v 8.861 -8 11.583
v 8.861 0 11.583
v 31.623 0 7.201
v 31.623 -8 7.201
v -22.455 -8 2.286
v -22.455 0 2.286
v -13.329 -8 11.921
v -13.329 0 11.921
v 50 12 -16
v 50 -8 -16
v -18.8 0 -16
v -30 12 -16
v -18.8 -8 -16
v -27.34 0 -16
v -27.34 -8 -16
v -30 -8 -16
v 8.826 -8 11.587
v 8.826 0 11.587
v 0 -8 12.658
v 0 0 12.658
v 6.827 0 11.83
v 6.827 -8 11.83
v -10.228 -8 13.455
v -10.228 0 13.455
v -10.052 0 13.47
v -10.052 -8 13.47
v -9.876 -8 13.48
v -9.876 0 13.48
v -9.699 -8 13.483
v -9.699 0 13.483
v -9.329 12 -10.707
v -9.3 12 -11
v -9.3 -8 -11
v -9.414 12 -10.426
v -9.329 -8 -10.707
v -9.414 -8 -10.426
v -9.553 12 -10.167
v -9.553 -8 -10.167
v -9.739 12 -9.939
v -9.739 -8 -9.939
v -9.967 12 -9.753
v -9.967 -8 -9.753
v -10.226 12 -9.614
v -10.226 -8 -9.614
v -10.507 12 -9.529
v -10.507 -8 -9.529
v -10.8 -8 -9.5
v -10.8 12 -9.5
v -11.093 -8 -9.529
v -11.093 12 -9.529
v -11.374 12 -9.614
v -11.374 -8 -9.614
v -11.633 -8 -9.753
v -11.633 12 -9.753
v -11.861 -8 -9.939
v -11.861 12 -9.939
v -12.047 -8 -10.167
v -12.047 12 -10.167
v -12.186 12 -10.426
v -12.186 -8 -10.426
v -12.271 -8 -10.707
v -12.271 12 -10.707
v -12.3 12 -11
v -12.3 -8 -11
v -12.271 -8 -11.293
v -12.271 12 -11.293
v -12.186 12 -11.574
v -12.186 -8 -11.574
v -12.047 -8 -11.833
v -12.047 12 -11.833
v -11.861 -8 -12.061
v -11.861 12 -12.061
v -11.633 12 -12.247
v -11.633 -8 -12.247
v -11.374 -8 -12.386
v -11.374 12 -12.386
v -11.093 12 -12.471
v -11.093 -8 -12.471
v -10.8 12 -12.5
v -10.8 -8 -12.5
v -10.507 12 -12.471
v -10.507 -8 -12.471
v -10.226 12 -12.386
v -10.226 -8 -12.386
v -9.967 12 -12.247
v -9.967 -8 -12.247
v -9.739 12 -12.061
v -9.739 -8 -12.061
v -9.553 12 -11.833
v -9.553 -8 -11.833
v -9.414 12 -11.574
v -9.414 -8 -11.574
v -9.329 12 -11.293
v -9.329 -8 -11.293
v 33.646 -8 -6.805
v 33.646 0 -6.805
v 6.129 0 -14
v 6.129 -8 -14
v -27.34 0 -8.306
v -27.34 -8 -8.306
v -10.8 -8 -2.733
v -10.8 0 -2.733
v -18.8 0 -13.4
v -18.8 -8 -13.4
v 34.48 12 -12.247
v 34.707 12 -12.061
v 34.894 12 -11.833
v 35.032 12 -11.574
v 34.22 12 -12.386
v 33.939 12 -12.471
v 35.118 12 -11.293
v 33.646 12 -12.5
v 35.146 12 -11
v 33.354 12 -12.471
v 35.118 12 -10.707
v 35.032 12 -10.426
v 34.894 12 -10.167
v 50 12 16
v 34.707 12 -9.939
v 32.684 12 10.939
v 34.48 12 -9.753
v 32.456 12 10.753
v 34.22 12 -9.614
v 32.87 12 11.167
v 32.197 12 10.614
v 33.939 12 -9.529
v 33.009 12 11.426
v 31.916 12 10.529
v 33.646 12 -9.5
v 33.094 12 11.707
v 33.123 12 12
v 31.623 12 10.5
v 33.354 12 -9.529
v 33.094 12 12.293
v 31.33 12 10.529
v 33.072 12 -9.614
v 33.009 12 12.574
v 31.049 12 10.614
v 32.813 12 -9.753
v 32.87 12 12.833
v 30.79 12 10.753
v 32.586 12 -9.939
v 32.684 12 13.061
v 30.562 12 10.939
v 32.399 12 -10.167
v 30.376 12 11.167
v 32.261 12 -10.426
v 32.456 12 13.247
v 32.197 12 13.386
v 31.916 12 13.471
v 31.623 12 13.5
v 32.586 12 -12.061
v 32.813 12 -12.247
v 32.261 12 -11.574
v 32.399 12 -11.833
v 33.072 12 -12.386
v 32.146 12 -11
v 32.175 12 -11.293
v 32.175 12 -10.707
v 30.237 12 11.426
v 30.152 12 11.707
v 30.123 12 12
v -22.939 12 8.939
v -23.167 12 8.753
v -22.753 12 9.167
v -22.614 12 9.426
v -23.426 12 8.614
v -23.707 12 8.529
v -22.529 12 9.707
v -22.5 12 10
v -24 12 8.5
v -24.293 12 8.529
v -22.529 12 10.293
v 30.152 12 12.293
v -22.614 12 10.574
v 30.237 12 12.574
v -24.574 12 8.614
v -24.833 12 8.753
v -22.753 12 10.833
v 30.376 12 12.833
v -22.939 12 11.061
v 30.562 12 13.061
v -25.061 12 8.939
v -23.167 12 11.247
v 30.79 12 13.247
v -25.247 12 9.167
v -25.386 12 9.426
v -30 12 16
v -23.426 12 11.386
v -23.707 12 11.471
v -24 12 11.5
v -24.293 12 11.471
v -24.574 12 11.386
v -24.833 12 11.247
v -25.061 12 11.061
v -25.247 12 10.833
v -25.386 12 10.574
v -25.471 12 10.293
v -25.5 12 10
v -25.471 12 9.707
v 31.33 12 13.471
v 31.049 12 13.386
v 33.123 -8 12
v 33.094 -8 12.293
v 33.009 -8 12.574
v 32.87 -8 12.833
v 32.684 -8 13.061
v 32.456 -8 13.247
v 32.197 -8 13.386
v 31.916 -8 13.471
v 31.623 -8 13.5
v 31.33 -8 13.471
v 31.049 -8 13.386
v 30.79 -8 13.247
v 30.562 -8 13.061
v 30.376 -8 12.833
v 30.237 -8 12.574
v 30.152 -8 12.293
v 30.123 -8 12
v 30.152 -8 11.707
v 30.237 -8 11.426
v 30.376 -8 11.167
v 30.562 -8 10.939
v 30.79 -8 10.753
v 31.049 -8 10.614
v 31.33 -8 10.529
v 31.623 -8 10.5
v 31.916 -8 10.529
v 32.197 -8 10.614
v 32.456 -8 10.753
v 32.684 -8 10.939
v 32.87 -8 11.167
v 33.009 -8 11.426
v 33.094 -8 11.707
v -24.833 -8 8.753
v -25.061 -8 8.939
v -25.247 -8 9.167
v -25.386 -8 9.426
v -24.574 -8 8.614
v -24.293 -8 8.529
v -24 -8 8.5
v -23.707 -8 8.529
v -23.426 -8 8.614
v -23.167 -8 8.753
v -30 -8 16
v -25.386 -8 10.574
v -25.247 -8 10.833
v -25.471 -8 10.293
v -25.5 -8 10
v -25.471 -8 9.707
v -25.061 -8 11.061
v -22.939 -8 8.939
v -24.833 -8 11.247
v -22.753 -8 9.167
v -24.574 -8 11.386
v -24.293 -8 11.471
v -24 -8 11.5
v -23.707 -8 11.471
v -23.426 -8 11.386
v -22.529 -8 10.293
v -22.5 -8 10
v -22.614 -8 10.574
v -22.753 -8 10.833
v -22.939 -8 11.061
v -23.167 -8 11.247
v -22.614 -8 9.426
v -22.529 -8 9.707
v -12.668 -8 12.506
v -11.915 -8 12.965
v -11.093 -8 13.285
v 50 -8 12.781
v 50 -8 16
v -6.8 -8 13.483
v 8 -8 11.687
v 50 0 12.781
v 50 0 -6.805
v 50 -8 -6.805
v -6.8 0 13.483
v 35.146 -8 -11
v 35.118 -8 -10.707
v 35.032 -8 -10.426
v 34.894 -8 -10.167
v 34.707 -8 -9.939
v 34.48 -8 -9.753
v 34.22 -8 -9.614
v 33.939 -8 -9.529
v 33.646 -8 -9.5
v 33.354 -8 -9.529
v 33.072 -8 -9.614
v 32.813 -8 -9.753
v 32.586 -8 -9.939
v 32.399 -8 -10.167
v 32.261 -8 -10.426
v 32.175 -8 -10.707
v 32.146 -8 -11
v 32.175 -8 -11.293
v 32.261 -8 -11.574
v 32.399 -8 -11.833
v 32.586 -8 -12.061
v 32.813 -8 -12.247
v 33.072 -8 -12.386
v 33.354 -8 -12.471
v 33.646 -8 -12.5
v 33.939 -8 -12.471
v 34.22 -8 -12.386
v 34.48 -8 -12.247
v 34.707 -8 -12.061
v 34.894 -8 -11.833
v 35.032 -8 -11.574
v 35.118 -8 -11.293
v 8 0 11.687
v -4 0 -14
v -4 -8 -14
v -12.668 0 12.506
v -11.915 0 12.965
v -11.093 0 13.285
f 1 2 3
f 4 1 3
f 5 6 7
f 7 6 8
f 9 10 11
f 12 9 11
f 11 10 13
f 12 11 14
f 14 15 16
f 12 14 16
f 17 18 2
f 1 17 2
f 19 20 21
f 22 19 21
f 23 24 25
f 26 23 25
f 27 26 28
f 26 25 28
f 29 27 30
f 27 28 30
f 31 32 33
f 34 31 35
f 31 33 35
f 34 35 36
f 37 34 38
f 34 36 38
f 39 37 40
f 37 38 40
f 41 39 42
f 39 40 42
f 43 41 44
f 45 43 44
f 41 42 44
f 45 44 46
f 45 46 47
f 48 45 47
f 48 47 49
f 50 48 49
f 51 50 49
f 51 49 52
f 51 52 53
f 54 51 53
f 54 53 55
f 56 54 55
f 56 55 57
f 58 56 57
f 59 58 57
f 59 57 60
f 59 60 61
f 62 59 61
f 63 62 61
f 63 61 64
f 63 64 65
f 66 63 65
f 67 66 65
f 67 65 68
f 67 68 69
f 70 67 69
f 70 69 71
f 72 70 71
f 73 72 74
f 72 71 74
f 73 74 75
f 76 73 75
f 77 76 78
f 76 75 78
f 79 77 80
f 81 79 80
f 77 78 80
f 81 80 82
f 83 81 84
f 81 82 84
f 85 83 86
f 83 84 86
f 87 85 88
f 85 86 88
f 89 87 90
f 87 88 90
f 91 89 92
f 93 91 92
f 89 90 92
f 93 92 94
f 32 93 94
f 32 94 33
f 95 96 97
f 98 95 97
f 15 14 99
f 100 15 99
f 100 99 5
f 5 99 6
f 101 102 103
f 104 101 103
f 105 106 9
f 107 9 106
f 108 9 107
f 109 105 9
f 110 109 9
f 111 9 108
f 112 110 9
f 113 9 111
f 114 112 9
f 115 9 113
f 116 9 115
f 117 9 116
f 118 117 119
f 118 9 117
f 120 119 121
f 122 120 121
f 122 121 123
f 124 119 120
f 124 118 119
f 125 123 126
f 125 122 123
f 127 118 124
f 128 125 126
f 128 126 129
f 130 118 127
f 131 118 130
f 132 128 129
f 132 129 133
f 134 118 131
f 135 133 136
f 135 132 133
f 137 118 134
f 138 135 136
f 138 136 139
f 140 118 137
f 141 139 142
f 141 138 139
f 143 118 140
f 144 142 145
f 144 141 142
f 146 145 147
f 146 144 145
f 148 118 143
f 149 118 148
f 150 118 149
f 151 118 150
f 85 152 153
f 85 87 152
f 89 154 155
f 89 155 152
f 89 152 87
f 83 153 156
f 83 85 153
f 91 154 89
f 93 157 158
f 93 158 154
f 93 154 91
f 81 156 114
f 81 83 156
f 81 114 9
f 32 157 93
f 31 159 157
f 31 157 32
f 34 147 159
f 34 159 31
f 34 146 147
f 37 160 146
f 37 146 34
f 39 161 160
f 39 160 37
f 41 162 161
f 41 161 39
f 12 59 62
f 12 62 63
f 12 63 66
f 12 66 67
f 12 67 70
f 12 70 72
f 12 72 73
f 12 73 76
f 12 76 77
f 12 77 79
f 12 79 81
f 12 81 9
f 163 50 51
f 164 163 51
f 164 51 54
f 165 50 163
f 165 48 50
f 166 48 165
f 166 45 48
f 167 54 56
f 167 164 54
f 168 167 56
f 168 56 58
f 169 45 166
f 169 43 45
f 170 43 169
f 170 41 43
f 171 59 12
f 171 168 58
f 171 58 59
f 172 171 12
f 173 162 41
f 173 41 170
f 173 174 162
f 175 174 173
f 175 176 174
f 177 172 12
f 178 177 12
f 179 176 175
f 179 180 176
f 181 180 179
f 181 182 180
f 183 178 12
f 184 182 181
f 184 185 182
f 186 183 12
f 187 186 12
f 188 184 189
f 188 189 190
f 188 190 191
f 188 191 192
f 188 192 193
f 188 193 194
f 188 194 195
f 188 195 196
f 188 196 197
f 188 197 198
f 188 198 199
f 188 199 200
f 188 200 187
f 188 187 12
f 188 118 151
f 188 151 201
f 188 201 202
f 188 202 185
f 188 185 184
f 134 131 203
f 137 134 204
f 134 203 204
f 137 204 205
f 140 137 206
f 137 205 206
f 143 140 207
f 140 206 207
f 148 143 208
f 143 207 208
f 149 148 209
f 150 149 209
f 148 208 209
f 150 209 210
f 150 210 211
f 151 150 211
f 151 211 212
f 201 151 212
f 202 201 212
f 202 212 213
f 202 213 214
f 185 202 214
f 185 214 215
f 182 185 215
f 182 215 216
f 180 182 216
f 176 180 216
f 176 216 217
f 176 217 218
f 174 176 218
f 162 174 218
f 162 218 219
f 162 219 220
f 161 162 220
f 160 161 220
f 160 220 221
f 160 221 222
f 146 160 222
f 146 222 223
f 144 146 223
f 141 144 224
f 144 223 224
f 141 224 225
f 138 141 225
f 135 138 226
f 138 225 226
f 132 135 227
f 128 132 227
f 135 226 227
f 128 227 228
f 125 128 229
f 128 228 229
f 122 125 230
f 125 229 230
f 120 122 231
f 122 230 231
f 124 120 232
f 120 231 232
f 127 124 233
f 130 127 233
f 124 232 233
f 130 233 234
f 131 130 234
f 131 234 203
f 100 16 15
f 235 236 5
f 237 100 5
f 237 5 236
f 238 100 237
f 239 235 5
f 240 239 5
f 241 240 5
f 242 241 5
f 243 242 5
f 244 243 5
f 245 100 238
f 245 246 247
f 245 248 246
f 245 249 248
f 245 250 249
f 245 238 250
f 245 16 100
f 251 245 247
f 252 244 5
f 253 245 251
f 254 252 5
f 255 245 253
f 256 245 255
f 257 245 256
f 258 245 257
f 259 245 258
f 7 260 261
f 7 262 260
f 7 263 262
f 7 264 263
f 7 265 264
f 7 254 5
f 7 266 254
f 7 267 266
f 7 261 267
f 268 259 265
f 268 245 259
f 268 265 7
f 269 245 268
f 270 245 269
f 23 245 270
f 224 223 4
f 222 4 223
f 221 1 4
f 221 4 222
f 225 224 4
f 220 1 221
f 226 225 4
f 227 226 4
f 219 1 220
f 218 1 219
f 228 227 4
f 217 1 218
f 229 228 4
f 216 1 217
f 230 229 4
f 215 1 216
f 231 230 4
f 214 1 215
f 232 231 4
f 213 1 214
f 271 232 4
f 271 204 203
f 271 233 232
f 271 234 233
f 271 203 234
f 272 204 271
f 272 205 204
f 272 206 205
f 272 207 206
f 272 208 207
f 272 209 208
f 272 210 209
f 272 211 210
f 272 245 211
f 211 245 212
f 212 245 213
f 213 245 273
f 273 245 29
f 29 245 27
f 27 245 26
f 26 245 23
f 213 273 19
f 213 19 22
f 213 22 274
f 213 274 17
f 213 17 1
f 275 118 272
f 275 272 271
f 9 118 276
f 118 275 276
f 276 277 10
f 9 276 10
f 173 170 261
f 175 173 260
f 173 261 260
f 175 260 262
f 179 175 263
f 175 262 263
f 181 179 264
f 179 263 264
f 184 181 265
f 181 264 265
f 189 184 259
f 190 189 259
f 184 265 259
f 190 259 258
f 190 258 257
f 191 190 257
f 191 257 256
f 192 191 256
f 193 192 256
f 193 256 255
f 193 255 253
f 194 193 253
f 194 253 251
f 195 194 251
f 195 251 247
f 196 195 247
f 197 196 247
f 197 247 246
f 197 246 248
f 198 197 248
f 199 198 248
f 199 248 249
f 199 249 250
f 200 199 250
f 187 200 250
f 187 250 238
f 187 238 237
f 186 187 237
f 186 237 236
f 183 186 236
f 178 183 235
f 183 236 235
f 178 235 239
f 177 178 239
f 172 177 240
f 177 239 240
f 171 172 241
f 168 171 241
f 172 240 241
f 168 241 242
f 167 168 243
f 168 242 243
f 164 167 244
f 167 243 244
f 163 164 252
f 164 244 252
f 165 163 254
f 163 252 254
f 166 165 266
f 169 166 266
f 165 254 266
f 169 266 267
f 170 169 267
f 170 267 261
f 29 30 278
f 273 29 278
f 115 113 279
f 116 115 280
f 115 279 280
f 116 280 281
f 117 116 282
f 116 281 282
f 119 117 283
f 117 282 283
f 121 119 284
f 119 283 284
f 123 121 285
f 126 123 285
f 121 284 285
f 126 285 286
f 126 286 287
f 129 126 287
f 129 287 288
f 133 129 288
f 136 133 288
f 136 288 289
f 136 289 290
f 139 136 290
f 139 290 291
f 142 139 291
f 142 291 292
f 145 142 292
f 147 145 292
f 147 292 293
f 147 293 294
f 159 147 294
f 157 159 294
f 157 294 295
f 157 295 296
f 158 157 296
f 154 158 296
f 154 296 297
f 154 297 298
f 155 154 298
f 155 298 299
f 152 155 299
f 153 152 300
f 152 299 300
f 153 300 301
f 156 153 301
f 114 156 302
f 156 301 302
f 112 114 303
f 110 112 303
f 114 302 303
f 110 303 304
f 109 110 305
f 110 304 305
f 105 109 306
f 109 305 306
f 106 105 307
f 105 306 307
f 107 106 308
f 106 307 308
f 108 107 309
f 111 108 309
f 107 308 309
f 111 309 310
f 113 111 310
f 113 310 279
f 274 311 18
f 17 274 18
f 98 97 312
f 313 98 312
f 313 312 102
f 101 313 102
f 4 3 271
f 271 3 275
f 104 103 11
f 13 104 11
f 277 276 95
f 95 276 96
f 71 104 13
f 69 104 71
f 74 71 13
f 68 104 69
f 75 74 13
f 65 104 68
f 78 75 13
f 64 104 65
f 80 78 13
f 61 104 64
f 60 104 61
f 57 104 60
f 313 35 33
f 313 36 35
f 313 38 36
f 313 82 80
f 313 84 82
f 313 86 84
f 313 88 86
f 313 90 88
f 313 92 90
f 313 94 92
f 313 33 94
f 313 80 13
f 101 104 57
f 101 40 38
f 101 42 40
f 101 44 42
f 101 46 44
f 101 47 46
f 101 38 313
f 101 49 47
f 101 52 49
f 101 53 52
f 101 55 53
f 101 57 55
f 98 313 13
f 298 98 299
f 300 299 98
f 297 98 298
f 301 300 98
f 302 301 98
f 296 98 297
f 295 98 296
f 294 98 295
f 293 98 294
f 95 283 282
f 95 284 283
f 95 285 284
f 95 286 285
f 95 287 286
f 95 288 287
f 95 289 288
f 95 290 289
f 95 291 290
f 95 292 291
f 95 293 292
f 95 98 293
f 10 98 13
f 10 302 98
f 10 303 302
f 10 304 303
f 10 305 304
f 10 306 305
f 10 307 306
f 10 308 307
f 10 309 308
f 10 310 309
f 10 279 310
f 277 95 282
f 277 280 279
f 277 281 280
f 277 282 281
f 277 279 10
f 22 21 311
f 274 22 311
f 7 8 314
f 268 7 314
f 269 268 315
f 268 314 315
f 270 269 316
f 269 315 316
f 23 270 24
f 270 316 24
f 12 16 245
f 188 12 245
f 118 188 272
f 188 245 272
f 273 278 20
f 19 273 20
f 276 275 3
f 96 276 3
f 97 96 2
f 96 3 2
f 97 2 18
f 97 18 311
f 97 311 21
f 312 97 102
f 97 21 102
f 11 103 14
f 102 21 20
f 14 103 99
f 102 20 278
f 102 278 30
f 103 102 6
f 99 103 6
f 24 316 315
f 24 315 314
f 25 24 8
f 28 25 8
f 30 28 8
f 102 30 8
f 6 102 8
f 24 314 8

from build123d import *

# Parameters (mm, degrees)
F1_DEPTH = 8
F3_DEPTH = 12
F4_R     = 1.5
F5_DEPTH = 20.001


with BuildPart() as f1:
    # F0 (on Front) → F1 (new body)
    with BuildSketch(Plane.XZ):
        with BuildLine():
            Line((6.826992, 11.829606), (8, 11.68729))
            Line((8, 11.68729), (8.825802, 11.587099))
            Line((8.825802, 11.587099), (8.860913, 11.582839))
            Line((8.860913, 11.582839), (31.622957, 7.201101))
            Line((31.622957, 7.201101), (50, 12.781211))
            Line((50, 12.781211), (50, 16))
            Line((50, 16), (8, 16))
            Line((8, 16), (-8, 16))
            Line((-8, 16), (-30, 16))
            Line((-30, 16), (-30, -16))
            Line((-30, -16), (-27.340422, -16))
            Line((-27.340422, -16), (-27.340422, -8.306063))
            Line((-27.340422, -8.306063), (-22.455454, 2.286336))
            Line((-22.455454, 2.286336), (-13.329045, 11.921342))
            ThreePointArc((-13.329045, 11.921342), (-11.915348, 12.964857), (-10.227935, 13.454859))
            ThreePointArc((-10.227935, 13.454859), (-9.96384, 13.475896), (-9.699001, 13.482915))
            Line((-9.699001, 13.482915), (-8, 13.482915))
            Line((-8, 13.482915), (-7.5937, 13.482915))
            Line((-7.5937, 13.482915), (-6.8, 13.482915))
            Line((-6.8, 13.482915), (0, 12.657898))
            Line((0, 12.657898), (6.826992, 11.829606))
        make_face()
        Polygon((0, -16), (0, -14), (-4, -14), (-10.8, -2.733333), (-18.8, -13.4), (-18.8, -16), align=None)
        Polygon((6.128575, -14), (0, -14), (0, -16), (50, -16), (50, -6.804848), (33.646384, -6.804848), align=None)
    extrude(amount=F1_DEPTH)

    # F2 (on face) → F3 (join)
    with BuildSketch(Plane(origin=(0, 0, 0), x_dir=(-1, 0, 0), z_dir=(0, 1, 0))):
        with BuildLine():
            Line((-31.622957, 7.201101), (-50, 12.781211))
            Line((-50, 12.781211), (-50, -6.804848))
            Line((-50, -6.804848), (-33.646384, -6.804848))
            Line((-33.646384, -6.804848), (-6.128575, -14))
            Line((-6.128575, -14), (4, -14))
            Line((4, -14), (10.8, -2.733333))
            Line((10.8, -2.733333), (18.8, -13.4))
            Line((18.8, -13.4), (18.8, -16))
            Line((18.8, -16), (27.340422, -16))
            Line((27.340422, -16), (27.340422, -8.306063))
            Line((27.340422, -8.306063), (22.455454, 2.286336))
            Line((22.455454, 2.286336), (13.329045, 11.921342))
            ThreePointArc((13.329045, 11.921342), (11.674838, 13.07596), (9.699001, 13.482915))
            Line((9.699001, 13.482915), (8, 13.482915))
            Line((8, 13.482915), (6.8, 13.482915))
            Line((6.8, 13.482915), (-8.860913, 11.582839))
            Line((-8.860913, 11.582839), (-31.622957, 7.201101))
        make_face()
        with BuildLine():
            Line((30, -16), (30, 16))
            Line((30, 16), (-50, 16))
            Line((-50, 16), (-50, 12.781211))
            Line((-50, 12.781211), (-31.622957, 7.201101))
            Line((-31.622957, 7.201101), (-8.860913, 11.582839))
            Line((-8.860913, 11.582839), (6.8, 13.482915))
            Line((6.8, 13.482915), (8, 13.482915))
            Line((8, 13.482915), (9.699001, 13.482915))
            ThreePointArc((9.699001, 13.482915), (11.674838, 13.07596), (13.329045, 11.921342))
            Line((13.329045, 11.921342), (22.455454, 2.286336))
            Line((22.455454, 2.286336), (27.340422, -8.306063))
            Line((27.340422, -8.306063), (27.340422, -16))
            Line((27.340422, -16), (30, -16))
        make_face()
        Polygon((-33.646384, -6.804848), (-50, -6.804848), (-50, -16), (18.8, -16), (18.8, -13.4), (10.8, -2.733333), (4, -14), (-6.128575, -14), align=None)
    extrude(amount=F3_DEPTH)

    # F4 (on face) → F5 (cut, through all)
    with BuildSketch(Plane.XZ.offset(8)):
        with Locations((-24, 10)):
            Circle(F4_R)
        with Locations((-10.8, -11)):
            Circle(F4_R)
        with Locations((33.646384, -11)):
            Circle(F4_R)
        with Locations((31.622957, 12)):
            Circle(F4_R)
    extrude(amount=-F5_DEPTH, mode=Mode.SUBTRACT)


solid = f1.part
